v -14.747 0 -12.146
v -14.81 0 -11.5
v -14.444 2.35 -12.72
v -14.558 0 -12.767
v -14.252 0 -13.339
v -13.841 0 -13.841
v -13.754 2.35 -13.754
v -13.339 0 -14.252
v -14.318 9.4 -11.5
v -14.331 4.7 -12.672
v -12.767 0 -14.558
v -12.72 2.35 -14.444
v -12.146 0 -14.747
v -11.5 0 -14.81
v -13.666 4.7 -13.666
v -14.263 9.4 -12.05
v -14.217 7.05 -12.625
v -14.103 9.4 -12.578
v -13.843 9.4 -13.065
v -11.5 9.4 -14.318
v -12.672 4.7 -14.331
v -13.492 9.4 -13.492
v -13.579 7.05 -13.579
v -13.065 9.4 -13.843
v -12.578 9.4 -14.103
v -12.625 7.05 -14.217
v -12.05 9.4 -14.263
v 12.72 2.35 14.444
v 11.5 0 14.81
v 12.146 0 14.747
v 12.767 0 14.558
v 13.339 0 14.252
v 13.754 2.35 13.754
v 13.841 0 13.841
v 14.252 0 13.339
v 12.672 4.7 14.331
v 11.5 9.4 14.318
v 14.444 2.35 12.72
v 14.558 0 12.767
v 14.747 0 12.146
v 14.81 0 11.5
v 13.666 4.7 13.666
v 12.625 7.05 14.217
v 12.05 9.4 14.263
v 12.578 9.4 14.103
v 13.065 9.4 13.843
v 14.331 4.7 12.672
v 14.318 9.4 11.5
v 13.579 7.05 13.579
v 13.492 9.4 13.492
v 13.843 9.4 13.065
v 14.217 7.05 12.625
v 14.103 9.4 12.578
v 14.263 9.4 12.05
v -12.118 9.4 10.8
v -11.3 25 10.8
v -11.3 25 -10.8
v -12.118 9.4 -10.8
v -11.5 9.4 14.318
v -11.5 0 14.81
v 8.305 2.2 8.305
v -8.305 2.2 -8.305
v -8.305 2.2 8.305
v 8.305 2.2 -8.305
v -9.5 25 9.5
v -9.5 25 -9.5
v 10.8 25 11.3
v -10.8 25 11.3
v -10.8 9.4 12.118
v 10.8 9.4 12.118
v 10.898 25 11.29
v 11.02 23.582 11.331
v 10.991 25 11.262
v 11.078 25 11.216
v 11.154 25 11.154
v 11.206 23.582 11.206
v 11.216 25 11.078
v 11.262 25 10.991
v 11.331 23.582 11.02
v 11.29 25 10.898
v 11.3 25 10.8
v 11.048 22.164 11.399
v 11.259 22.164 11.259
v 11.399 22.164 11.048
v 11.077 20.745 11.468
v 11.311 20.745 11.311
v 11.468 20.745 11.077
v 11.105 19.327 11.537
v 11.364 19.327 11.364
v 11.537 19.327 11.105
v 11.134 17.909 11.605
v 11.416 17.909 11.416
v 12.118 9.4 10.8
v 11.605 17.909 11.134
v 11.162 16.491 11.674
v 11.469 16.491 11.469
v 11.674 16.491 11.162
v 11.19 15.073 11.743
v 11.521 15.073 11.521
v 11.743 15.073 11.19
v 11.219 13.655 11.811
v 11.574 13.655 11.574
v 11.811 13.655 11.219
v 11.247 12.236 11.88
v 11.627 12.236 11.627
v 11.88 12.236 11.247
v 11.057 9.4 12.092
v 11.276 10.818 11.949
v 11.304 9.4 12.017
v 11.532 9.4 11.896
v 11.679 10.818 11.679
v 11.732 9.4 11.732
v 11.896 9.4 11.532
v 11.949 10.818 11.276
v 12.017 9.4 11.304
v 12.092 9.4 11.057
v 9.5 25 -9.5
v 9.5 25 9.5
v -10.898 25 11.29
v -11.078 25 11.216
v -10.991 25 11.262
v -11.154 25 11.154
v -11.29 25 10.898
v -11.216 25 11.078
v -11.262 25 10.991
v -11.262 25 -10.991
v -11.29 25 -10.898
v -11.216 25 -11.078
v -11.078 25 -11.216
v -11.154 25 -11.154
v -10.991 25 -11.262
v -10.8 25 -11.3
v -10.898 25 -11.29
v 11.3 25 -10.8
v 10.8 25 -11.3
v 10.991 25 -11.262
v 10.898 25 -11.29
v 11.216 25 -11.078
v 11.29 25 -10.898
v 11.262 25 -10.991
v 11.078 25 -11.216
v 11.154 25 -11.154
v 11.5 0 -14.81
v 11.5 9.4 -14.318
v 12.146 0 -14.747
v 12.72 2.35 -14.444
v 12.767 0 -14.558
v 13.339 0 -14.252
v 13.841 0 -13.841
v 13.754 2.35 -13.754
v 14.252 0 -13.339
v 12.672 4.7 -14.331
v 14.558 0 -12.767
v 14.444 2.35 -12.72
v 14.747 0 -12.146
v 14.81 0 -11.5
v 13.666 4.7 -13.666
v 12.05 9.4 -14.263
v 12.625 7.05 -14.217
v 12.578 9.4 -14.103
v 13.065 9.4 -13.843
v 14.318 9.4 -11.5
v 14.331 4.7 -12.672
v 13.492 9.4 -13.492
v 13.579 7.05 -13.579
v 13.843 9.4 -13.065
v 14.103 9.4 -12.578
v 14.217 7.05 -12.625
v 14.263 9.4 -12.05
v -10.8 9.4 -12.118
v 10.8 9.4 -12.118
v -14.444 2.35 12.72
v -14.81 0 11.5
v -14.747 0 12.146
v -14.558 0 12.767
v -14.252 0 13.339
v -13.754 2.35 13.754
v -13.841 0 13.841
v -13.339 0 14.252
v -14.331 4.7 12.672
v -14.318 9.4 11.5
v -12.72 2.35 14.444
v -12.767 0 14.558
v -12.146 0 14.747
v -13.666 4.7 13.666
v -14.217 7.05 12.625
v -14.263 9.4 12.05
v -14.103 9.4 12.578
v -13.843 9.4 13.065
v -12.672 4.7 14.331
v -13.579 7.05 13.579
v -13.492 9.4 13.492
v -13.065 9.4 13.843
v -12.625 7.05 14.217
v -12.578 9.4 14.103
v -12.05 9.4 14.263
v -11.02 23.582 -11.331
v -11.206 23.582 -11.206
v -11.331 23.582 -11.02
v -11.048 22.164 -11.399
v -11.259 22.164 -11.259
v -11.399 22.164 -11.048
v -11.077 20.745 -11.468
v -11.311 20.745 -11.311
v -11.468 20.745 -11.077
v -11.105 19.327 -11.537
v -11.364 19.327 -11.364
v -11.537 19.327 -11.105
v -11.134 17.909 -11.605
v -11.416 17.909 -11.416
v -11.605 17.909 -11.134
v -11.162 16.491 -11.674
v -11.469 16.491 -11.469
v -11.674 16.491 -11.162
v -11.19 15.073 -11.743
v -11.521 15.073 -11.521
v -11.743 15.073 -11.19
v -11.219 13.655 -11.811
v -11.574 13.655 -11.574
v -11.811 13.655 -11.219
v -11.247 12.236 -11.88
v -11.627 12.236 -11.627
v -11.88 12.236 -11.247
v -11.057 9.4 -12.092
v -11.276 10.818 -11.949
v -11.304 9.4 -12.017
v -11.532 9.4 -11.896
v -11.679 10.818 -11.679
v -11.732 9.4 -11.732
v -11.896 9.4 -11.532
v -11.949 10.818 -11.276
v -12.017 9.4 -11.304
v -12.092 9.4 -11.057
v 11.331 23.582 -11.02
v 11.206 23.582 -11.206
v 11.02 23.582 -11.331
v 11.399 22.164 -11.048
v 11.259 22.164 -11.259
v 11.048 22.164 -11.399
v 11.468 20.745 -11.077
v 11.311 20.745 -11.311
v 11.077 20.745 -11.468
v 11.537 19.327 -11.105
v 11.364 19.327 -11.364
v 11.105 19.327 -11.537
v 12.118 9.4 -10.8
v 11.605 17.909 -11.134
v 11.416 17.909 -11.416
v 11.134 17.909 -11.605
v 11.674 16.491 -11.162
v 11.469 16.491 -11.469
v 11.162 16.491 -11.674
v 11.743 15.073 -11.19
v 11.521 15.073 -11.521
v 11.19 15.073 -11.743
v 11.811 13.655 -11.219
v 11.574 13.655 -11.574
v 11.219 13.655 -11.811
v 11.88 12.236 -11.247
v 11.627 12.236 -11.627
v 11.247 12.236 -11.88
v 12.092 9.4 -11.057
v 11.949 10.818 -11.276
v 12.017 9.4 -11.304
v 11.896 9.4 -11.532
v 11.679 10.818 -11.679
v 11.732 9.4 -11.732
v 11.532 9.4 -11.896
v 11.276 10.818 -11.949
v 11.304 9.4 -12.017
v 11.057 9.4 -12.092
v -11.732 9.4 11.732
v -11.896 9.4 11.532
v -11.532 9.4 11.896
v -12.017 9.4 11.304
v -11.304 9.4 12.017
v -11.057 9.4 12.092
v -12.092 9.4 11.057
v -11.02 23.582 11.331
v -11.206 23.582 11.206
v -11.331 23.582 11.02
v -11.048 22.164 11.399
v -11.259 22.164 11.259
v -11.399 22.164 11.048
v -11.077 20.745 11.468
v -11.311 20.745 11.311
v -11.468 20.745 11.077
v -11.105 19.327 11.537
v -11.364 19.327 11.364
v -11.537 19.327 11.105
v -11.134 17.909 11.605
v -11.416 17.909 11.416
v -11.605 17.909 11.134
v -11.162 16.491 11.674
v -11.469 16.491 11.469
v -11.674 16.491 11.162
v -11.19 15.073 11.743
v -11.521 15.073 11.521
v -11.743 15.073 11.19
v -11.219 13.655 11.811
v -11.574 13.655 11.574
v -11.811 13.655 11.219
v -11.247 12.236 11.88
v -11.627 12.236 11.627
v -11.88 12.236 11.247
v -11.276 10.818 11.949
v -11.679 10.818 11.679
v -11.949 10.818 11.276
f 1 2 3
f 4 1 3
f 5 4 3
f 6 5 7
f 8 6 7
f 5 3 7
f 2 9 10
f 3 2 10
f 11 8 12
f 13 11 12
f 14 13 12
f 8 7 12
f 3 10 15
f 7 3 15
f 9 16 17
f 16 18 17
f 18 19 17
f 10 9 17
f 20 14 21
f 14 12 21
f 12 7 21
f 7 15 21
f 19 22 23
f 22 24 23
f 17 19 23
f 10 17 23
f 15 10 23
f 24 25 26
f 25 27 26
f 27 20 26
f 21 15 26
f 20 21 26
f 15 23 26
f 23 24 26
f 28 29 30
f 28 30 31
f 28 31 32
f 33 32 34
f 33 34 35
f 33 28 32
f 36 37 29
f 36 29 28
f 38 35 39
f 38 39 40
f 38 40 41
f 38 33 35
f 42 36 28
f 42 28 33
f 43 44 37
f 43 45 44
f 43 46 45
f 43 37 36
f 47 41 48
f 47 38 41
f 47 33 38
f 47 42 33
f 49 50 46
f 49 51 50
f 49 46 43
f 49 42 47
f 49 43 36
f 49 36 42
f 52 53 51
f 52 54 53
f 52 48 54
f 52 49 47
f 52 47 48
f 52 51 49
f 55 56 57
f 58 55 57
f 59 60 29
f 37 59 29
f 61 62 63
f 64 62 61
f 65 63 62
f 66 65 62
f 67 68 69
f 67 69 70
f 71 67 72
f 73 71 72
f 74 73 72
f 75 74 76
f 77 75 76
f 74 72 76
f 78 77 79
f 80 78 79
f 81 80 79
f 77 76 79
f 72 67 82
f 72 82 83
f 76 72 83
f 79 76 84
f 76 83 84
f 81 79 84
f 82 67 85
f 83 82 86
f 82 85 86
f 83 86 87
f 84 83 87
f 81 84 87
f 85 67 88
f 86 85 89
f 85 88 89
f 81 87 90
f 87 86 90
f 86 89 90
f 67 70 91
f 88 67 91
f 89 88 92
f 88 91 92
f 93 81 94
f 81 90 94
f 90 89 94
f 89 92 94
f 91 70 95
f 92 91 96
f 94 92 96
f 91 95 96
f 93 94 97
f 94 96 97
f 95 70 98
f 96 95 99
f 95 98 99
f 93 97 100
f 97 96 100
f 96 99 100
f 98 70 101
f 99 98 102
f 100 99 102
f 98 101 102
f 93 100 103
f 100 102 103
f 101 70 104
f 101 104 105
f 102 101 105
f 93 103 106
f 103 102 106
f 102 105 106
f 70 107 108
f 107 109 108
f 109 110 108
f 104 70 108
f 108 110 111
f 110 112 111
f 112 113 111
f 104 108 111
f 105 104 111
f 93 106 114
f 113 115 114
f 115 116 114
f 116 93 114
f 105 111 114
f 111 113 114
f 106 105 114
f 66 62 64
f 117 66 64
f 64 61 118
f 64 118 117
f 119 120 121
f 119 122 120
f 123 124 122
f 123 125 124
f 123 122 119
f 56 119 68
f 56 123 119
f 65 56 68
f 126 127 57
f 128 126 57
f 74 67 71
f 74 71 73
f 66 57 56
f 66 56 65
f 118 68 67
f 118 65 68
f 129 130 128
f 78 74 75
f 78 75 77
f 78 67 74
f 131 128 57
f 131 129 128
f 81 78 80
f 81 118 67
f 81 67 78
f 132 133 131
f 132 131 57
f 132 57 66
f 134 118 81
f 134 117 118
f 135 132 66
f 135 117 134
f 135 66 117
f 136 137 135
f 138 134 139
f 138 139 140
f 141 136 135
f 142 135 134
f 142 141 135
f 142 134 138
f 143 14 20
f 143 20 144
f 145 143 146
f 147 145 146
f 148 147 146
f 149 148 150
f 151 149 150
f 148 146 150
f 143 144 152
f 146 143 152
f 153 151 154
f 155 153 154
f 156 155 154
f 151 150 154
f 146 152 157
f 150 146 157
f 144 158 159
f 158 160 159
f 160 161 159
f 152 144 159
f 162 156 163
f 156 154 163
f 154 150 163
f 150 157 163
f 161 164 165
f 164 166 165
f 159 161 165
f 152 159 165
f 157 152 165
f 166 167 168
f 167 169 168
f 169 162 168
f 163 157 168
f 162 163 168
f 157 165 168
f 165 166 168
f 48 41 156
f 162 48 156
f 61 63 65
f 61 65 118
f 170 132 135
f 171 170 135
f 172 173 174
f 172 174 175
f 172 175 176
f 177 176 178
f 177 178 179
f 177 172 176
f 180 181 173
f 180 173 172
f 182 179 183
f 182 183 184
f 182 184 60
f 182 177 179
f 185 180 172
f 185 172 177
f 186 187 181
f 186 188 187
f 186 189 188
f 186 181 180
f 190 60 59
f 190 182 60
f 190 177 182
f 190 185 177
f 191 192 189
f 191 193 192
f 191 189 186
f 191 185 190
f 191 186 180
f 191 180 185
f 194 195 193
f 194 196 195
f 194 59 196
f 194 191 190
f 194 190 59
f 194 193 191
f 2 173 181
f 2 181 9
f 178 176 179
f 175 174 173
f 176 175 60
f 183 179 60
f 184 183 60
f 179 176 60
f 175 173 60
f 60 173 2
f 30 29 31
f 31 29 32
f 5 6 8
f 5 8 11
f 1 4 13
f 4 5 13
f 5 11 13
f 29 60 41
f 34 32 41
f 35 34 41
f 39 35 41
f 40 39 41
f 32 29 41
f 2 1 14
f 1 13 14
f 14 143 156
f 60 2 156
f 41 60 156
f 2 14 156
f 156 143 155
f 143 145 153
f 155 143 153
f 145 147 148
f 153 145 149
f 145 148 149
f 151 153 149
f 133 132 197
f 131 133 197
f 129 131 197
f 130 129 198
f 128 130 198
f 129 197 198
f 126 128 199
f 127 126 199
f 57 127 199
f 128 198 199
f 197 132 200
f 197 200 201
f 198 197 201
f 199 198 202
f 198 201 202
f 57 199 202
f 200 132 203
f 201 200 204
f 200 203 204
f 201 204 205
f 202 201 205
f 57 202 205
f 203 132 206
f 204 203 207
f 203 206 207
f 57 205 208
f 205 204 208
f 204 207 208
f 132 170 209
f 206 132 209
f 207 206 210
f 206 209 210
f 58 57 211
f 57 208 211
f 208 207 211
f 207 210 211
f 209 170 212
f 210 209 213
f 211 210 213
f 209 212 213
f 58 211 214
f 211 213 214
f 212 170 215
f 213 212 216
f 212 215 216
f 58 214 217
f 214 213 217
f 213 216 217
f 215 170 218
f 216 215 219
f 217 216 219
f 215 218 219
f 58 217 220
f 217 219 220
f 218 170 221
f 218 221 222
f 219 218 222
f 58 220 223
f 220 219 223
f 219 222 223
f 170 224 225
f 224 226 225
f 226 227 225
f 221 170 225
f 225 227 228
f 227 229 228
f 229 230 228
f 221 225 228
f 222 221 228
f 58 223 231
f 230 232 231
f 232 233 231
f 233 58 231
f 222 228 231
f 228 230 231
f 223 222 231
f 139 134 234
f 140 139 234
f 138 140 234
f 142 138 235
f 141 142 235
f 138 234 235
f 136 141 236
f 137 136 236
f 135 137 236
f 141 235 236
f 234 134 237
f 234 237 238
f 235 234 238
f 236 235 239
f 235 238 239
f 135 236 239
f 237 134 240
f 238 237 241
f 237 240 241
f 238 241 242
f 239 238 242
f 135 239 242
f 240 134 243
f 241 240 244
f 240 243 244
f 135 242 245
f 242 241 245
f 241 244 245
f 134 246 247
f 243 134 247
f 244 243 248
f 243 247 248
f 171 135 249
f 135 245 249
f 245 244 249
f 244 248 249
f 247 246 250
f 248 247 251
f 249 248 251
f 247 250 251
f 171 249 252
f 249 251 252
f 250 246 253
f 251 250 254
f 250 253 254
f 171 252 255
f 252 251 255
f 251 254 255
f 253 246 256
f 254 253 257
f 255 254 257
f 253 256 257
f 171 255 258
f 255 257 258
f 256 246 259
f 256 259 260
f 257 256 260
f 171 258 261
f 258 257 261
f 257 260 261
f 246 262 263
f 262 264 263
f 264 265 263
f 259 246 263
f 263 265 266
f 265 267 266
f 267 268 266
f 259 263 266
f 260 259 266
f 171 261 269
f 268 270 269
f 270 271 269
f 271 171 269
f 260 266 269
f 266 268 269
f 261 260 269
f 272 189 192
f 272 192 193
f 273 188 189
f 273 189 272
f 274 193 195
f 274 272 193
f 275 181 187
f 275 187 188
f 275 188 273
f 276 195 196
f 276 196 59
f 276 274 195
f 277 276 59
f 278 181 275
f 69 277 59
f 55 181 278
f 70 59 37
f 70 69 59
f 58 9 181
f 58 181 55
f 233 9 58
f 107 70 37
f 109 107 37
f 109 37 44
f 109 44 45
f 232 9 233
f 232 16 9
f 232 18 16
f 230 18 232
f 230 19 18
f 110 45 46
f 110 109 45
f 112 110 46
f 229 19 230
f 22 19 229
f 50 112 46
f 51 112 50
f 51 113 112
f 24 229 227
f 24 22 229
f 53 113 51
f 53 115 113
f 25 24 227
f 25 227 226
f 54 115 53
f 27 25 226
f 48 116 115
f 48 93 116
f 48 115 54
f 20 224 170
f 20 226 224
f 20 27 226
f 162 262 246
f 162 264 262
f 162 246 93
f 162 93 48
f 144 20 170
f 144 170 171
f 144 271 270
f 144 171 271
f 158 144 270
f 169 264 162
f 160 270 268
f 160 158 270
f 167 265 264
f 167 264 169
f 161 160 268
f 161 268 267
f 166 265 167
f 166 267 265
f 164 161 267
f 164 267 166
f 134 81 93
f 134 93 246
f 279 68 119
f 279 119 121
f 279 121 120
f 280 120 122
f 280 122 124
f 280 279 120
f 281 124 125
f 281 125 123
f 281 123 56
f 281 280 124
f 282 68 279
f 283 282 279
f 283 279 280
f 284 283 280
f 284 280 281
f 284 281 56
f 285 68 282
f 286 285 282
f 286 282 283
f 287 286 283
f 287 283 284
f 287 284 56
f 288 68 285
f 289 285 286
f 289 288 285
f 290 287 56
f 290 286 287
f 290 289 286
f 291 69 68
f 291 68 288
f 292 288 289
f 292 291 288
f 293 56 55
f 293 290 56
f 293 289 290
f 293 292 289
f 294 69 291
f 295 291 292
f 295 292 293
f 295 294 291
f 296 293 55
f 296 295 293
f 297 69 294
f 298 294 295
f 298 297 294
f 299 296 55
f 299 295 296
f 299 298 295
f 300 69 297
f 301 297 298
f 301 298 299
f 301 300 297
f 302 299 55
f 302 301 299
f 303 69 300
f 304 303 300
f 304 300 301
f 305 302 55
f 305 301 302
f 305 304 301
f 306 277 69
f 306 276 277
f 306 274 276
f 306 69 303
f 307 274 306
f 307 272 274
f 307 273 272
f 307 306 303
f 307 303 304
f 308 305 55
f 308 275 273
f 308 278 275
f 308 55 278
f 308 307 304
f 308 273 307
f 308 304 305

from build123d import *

# Parameters (mm, degrees)
SKETCH1_W           = 27
SKETCH1_H           = 27
BOSS_EXTRUDE1_DEPTH = 25
SKETCH2_W           = 27
SKETCH2_H           = 27
SKETCH2_W_2         = 22.6
SKETCH2_H_2         = 22.6
CUT_EXTRUDE1_DEPTH  = 15.6
SKETCH3_W           = 19
SKETCH3_H           = 19
CUT_EXTRUDE2_DEPTH  = 22.8
FILLET1_R           = 0.5
FILLET2_R           = 2
DRAFT12_ANGLE       = 3


with BuildPart() as part:
    # Sketch1 → Boss-Extrude1 (new body)
    with BuildSketch(Plane(origin=(0, 0, 0), x_dir=(1, 0, 0), z_dir=(0, 1, 0))):
        Rectangle(SKETCH1_W, SKETCH1_H)
    extrude(amount=BOSS_EXTRUDE1_DEPTH)

    # Sketch2 → Cut-Extrude1 (cut)
    with BuildSketch(Plane(origin=(0, 25, 0), x_dir=(1, 0, 0), z_dir=(0, 1, 0))):
        Rectangle(SKETCH2_W, SKETCH2_H)
        Rectangle(SKETCH2_W_2, SKETCH2_H_2, mode=Mode.SUBTRACT)
    extrude(amount=-CUT_EXTRUDE1_DEPTH, mode=Mode.SUBTRACT)

    # Sketch3 → Cut-Extrude2 (cut)
    with BuildSketch(Plane(origin=(0, 25, 0), x_dir=(1, 0, 0), z_dir=(0, 1, 0))):
        Rectangle(SKETCH3_W, SKETCH3_H)
    extrude(amount=-CUT_EXTRUDE2_DEPTH, mode=Mode.SUBTRACT)

    # Fillet1
    fillet1_edges = [part.edges().sort_by_distance(p)[0] for p in [
        (-11.3, 17.2, 11.3),
        (-11.3, 17.2, -11.3),
        (11.3, 17.2, -11.3),
        (11.3, 17.2, 11.3),
    ]]
    fillet(fillet1_edges, radius=FILLET1_R)

    # Fillet2
    fillet2_edges = [part.edges().sort_by_distance(p)[0] for p in [
        (-13.5, 4.7, -13.5),
        (13.5, 4.7, -13.5),
        (13.5, 4.7, 13.5),
        (-13.5, 4.7, 13.5),
    ]]
    fillet(fillet2_edges, radius=FILLET2_R)

    # Draft12
    draft12_faces = [part.faces().sort_by_distance(p)[0] for p in [
        (13.5, 4.7, 0),
        (9.5, 13.6, 0),
        (0, 13.6, 9.5),
        (-9.5, 13.6, 0),
        (0, 13.6, -9.5),
        (-11.153553391, 17.2, -11.153553391),
        (-12.914213562, 4.7, -12.914213562),
        (-13.5, 4.7, 0),
        (-11.3, 17.2, 0),
        (-11.153553391, 17.2, 11.153553391),
        (-12.914213562, 4.7, 12.914213562),
        (0, 4.7, 13.5),
        (12.914213562, 4.7, 12.914213562),
        (11.153553391, 17.2, 11.153553391),
        (0, 17.2, 11.3),
        (11.3, 17.2, 0),
        (11.153553391, 17.2, -11.153553391),
        (0, 17.2, -11.3),
        (0, 4.7, -13.5),
        (12.914213562, 4.7, -12.914213562),
    ]]
    draft(draft12_faces, Plane.ZX.offset(25), DRAFT12_ANGLE)


solid = part.part
